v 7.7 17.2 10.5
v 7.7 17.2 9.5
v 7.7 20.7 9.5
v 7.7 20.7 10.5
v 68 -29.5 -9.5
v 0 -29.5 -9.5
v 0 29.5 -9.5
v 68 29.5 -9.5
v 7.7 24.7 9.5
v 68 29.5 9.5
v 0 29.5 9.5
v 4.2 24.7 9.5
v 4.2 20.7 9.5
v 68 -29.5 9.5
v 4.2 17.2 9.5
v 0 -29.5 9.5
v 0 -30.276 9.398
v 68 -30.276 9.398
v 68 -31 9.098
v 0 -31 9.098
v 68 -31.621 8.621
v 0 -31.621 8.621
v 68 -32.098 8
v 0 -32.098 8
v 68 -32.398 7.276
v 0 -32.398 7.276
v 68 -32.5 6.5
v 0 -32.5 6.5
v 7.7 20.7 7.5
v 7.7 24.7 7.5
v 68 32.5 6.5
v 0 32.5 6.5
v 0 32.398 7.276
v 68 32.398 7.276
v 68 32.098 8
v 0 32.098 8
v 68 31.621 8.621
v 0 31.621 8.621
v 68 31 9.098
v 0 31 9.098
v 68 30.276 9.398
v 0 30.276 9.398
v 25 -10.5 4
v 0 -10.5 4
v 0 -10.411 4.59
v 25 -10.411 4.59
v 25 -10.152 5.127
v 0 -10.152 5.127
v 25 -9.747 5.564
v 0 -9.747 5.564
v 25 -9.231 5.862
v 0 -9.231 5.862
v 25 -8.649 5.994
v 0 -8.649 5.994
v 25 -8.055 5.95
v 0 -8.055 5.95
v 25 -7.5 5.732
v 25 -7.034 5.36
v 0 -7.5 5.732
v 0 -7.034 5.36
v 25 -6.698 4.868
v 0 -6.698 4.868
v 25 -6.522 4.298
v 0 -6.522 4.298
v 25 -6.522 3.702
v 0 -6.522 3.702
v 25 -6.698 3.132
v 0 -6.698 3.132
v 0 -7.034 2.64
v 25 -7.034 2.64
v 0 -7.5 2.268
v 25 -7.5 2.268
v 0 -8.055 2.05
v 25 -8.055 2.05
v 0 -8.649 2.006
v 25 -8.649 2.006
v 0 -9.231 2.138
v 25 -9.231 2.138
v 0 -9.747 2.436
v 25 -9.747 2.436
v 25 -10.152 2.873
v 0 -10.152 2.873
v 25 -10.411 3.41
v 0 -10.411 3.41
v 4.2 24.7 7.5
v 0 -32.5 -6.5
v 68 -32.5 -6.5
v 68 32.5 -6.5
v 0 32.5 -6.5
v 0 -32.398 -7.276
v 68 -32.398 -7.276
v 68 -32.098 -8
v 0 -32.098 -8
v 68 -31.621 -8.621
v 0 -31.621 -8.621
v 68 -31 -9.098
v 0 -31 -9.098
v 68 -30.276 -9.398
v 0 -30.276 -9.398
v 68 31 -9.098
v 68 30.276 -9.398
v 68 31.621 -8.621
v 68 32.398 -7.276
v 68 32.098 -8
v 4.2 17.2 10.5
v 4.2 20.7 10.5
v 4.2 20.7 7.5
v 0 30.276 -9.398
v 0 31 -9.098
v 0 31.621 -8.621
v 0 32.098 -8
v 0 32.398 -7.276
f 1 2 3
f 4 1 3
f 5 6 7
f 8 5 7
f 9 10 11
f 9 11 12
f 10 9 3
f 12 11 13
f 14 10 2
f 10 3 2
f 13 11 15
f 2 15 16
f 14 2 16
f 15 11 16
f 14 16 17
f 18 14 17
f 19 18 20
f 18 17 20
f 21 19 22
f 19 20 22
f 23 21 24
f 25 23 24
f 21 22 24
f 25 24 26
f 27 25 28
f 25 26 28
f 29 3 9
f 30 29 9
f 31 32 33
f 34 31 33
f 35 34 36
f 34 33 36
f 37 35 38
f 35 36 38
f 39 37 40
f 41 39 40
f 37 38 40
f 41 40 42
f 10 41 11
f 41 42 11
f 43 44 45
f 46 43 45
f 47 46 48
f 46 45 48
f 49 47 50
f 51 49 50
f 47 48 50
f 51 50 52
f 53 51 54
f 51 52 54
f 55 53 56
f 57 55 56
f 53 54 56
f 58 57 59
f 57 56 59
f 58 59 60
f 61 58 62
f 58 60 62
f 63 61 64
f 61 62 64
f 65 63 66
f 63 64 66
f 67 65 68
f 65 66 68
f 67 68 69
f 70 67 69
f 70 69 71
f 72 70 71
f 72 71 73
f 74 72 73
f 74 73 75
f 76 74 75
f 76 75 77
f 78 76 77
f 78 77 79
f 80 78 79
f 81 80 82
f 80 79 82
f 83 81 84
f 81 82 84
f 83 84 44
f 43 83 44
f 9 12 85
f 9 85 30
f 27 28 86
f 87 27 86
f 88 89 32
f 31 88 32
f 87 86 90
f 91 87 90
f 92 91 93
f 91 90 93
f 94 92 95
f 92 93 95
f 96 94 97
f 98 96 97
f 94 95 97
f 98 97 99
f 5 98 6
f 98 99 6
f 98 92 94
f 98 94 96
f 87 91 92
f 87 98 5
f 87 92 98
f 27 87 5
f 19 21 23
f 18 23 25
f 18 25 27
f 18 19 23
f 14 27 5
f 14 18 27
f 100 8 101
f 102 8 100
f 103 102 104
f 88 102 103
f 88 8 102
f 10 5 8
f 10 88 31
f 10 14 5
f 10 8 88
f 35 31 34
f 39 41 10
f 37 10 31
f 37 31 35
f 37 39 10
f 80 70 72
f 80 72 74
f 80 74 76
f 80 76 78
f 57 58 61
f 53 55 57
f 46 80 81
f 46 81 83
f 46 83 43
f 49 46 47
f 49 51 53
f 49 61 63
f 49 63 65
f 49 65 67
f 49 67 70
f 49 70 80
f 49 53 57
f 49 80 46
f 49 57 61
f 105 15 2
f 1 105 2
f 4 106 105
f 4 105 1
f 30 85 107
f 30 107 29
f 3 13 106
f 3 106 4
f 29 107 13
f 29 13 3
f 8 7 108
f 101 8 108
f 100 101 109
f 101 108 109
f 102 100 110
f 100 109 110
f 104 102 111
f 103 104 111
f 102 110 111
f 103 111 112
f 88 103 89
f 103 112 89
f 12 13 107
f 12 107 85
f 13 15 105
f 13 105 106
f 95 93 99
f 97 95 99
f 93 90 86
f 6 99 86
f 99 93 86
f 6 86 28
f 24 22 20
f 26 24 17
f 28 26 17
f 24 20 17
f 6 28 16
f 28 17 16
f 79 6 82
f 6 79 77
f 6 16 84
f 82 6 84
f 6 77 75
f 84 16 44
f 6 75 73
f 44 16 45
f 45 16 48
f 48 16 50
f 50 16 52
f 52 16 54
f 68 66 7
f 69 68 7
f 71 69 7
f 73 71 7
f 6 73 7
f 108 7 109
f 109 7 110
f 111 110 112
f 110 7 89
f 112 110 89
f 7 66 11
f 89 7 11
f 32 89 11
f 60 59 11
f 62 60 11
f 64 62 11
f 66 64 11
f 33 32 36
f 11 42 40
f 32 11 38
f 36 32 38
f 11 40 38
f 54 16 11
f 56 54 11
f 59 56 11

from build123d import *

# Parameters (mm, degrees)
F1_DEPTH = 68
F2_W     = 3.5
F2_H     = 7.5
F3_DEPTH = 2
F4_R     = 2
F5_DEPTH = 25
F6_W     = 3.5
F6_H     = 3.5
F7_DEPTH = 3


with BuildPart() as f1:
    # F0 (on Right) → F1 (new body)
    with BuildSketch(Plane.YZ):
        with BuildLine():
            Line((-29.5, -9.5), (29.5, -9.5))
            ThreePointArc((29.5, -9.5), (31.62132, -8.62132), (32.5, -6.5))
            Line((32.5, -6.5), (32.5, 6.5))
            ThreePointArc((32.5, 6.5), (31.62132, 8.62132), (29.5, 9.5))
            Line((29.5, 9.5), (-29.5, 9.5))
            ThreePointArc((-29.5, 9.5), (-31.62132, 8.62132), (-32.5, 6.5))
            Line((-32.5, 6.5), (-32.5, -6.5))
            ThreePointArc((-32.5, -6.5), (-31.62132, -8.62132), (-29.5, -9.5))
        make_face()
    extrude(amount=F1_DEPTH)

    # F2 (on face) → F3 (cut)
    with BuildSketch(Plane.XY.offset(9.5)):
        with Locations((5.95, 20.95)):
            Rectangle(F2_W, F2_H)
    extrude(amount=-F3_DEPTH, mode=Mode.SUBTRACT)

    # F4 (on face) → F5 (cut)
    with BuildSketch(Plane(origin=(0, 0, 0), x_dir=(0, -1, 0), z_dir=(-1, 0, 0))):
        with Locations((8.5, 4)):
            Circle(F4_R)
    extrude(amount=-F5_DEPTH, mode=Mode.SUBTRACT)

    # F6 (on face) → F7 (join)
    with BuildSketch(Plane.XY.offset(7.5)):
        with Locations((5.95, 18.95)):
            Rectangle(F6_W, F6_H)
    extrude(amount=F7_DEPTH)


solid = f1.part
